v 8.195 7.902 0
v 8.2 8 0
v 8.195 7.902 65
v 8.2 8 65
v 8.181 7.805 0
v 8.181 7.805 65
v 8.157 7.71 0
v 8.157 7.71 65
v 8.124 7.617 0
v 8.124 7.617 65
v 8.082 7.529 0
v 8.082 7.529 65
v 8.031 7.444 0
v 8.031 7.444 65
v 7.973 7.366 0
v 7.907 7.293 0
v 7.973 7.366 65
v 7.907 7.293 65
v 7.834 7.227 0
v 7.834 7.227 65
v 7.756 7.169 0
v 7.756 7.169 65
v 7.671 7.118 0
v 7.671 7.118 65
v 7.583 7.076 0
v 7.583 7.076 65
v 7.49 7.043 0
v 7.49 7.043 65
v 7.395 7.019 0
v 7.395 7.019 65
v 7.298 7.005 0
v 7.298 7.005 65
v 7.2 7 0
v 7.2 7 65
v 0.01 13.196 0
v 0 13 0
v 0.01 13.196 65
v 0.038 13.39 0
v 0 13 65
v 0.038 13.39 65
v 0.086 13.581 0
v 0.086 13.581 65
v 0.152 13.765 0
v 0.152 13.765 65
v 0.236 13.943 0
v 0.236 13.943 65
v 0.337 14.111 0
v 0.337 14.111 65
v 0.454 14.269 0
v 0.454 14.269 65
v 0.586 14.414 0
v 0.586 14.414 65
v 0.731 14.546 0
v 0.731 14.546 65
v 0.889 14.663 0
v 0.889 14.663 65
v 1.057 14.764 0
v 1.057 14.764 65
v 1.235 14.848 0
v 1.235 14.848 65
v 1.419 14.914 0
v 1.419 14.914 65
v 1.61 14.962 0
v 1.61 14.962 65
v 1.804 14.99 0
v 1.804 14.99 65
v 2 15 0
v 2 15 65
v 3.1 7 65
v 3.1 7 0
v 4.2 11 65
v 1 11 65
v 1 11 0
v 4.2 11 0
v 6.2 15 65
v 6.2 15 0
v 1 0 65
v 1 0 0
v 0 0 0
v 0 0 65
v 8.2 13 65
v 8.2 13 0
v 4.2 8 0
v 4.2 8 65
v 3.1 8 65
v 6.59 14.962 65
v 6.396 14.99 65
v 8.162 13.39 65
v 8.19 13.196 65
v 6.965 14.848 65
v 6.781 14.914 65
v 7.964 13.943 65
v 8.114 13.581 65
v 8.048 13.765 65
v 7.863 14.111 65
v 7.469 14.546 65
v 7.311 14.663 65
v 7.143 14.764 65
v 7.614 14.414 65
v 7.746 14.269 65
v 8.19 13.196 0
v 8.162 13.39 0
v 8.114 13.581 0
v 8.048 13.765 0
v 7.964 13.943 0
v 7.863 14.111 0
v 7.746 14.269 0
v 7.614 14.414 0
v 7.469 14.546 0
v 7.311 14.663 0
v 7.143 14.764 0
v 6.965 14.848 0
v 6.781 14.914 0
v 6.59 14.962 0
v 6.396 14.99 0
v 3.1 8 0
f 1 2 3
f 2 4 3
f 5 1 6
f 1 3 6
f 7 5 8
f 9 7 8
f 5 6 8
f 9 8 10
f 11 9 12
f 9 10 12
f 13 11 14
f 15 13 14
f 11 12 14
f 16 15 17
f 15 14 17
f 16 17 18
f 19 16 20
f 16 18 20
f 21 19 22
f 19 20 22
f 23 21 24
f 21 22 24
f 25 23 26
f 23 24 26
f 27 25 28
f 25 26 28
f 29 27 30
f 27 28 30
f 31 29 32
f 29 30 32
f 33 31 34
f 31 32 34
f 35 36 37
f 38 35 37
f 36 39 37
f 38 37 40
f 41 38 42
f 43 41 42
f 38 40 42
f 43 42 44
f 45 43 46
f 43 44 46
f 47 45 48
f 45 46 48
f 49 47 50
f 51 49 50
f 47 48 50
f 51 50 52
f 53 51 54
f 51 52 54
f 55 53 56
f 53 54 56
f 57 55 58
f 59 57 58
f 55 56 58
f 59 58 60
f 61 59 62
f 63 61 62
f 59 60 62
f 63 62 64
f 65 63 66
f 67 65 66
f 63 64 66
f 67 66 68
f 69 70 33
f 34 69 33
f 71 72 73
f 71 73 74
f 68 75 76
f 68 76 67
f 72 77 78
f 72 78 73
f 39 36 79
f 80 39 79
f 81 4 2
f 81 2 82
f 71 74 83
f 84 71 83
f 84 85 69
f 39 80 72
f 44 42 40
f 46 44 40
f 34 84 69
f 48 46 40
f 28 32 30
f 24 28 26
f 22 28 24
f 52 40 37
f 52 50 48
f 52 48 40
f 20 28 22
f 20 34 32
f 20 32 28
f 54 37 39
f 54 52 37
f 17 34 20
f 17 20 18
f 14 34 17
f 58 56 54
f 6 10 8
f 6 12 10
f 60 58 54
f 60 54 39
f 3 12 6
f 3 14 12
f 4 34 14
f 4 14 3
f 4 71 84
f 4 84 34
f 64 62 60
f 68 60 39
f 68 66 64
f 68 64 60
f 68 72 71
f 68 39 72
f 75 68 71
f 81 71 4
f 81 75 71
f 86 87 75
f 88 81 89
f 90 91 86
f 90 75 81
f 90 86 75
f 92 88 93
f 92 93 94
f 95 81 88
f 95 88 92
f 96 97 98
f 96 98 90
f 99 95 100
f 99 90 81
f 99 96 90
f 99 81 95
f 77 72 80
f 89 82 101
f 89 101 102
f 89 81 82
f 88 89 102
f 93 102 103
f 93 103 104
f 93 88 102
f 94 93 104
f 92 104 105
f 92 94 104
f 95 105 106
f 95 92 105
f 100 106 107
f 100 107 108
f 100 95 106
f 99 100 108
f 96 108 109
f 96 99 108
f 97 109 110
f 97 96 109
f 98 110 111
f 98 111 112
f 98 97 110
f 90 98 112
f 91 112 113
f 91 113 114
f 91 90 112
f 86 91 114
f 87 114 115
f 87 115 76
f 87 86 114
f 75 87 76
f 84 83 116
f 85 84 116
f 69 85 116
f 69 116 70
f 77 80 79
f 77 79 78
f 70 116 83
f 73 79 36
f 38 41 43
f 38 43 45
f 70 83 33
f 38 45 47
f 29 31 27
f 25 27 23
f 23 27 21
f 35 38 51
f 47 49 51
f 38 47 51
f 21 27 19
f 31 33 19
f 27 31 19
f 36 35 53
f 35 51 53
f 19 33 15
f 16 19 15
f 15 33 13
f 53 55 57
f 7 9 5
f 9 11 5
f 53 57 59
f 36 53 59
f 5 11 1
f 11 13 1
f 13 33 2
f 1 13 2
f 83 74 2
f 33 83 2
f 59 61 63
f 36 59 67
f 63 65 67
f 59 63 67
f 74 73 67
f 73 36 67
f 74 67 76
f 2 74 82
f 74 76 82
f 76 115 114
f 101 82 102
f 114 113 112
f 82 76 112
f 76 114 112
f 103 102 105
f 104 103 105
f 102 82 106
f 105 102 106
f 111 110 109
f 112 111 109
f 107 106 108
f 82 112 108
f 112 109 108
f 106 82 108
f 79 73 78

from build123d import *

# Parameters (mm, degrees)
F1_DEPTH = 65
F2_R     = 2
F3_R     = 1


with BuildPart() as f1:
    # F0 (on Top) → F1 (new body)
    with BuildSketch(Plane.XY):
        Polygon((0, 15), (0, 0), (1, 0), (1, 11), (4.2, 11), (4.2, 8), (3.1, 8), (3.1, 7), (4.2, 7), (8.2, 7), (8.2, 15), align=None)
    extrude(amount=F1_DEPTH)

    # F2
    f2_edges = [f1.edges().sort_by_distance(p)[0] for p in [
        (8.2, 15, 32.5),
        (0, 15, 32.5),
    ]]
    fillet(f2_edges, radius=F2_R)

    # F3
    f3_edges = [f1.edges().sort_by_distance(p)[0] for p in [
        (8.2, 7, 32.5),
    ]]
    fillet(f3_edges, radius=F3_R)


solid = f1.part
